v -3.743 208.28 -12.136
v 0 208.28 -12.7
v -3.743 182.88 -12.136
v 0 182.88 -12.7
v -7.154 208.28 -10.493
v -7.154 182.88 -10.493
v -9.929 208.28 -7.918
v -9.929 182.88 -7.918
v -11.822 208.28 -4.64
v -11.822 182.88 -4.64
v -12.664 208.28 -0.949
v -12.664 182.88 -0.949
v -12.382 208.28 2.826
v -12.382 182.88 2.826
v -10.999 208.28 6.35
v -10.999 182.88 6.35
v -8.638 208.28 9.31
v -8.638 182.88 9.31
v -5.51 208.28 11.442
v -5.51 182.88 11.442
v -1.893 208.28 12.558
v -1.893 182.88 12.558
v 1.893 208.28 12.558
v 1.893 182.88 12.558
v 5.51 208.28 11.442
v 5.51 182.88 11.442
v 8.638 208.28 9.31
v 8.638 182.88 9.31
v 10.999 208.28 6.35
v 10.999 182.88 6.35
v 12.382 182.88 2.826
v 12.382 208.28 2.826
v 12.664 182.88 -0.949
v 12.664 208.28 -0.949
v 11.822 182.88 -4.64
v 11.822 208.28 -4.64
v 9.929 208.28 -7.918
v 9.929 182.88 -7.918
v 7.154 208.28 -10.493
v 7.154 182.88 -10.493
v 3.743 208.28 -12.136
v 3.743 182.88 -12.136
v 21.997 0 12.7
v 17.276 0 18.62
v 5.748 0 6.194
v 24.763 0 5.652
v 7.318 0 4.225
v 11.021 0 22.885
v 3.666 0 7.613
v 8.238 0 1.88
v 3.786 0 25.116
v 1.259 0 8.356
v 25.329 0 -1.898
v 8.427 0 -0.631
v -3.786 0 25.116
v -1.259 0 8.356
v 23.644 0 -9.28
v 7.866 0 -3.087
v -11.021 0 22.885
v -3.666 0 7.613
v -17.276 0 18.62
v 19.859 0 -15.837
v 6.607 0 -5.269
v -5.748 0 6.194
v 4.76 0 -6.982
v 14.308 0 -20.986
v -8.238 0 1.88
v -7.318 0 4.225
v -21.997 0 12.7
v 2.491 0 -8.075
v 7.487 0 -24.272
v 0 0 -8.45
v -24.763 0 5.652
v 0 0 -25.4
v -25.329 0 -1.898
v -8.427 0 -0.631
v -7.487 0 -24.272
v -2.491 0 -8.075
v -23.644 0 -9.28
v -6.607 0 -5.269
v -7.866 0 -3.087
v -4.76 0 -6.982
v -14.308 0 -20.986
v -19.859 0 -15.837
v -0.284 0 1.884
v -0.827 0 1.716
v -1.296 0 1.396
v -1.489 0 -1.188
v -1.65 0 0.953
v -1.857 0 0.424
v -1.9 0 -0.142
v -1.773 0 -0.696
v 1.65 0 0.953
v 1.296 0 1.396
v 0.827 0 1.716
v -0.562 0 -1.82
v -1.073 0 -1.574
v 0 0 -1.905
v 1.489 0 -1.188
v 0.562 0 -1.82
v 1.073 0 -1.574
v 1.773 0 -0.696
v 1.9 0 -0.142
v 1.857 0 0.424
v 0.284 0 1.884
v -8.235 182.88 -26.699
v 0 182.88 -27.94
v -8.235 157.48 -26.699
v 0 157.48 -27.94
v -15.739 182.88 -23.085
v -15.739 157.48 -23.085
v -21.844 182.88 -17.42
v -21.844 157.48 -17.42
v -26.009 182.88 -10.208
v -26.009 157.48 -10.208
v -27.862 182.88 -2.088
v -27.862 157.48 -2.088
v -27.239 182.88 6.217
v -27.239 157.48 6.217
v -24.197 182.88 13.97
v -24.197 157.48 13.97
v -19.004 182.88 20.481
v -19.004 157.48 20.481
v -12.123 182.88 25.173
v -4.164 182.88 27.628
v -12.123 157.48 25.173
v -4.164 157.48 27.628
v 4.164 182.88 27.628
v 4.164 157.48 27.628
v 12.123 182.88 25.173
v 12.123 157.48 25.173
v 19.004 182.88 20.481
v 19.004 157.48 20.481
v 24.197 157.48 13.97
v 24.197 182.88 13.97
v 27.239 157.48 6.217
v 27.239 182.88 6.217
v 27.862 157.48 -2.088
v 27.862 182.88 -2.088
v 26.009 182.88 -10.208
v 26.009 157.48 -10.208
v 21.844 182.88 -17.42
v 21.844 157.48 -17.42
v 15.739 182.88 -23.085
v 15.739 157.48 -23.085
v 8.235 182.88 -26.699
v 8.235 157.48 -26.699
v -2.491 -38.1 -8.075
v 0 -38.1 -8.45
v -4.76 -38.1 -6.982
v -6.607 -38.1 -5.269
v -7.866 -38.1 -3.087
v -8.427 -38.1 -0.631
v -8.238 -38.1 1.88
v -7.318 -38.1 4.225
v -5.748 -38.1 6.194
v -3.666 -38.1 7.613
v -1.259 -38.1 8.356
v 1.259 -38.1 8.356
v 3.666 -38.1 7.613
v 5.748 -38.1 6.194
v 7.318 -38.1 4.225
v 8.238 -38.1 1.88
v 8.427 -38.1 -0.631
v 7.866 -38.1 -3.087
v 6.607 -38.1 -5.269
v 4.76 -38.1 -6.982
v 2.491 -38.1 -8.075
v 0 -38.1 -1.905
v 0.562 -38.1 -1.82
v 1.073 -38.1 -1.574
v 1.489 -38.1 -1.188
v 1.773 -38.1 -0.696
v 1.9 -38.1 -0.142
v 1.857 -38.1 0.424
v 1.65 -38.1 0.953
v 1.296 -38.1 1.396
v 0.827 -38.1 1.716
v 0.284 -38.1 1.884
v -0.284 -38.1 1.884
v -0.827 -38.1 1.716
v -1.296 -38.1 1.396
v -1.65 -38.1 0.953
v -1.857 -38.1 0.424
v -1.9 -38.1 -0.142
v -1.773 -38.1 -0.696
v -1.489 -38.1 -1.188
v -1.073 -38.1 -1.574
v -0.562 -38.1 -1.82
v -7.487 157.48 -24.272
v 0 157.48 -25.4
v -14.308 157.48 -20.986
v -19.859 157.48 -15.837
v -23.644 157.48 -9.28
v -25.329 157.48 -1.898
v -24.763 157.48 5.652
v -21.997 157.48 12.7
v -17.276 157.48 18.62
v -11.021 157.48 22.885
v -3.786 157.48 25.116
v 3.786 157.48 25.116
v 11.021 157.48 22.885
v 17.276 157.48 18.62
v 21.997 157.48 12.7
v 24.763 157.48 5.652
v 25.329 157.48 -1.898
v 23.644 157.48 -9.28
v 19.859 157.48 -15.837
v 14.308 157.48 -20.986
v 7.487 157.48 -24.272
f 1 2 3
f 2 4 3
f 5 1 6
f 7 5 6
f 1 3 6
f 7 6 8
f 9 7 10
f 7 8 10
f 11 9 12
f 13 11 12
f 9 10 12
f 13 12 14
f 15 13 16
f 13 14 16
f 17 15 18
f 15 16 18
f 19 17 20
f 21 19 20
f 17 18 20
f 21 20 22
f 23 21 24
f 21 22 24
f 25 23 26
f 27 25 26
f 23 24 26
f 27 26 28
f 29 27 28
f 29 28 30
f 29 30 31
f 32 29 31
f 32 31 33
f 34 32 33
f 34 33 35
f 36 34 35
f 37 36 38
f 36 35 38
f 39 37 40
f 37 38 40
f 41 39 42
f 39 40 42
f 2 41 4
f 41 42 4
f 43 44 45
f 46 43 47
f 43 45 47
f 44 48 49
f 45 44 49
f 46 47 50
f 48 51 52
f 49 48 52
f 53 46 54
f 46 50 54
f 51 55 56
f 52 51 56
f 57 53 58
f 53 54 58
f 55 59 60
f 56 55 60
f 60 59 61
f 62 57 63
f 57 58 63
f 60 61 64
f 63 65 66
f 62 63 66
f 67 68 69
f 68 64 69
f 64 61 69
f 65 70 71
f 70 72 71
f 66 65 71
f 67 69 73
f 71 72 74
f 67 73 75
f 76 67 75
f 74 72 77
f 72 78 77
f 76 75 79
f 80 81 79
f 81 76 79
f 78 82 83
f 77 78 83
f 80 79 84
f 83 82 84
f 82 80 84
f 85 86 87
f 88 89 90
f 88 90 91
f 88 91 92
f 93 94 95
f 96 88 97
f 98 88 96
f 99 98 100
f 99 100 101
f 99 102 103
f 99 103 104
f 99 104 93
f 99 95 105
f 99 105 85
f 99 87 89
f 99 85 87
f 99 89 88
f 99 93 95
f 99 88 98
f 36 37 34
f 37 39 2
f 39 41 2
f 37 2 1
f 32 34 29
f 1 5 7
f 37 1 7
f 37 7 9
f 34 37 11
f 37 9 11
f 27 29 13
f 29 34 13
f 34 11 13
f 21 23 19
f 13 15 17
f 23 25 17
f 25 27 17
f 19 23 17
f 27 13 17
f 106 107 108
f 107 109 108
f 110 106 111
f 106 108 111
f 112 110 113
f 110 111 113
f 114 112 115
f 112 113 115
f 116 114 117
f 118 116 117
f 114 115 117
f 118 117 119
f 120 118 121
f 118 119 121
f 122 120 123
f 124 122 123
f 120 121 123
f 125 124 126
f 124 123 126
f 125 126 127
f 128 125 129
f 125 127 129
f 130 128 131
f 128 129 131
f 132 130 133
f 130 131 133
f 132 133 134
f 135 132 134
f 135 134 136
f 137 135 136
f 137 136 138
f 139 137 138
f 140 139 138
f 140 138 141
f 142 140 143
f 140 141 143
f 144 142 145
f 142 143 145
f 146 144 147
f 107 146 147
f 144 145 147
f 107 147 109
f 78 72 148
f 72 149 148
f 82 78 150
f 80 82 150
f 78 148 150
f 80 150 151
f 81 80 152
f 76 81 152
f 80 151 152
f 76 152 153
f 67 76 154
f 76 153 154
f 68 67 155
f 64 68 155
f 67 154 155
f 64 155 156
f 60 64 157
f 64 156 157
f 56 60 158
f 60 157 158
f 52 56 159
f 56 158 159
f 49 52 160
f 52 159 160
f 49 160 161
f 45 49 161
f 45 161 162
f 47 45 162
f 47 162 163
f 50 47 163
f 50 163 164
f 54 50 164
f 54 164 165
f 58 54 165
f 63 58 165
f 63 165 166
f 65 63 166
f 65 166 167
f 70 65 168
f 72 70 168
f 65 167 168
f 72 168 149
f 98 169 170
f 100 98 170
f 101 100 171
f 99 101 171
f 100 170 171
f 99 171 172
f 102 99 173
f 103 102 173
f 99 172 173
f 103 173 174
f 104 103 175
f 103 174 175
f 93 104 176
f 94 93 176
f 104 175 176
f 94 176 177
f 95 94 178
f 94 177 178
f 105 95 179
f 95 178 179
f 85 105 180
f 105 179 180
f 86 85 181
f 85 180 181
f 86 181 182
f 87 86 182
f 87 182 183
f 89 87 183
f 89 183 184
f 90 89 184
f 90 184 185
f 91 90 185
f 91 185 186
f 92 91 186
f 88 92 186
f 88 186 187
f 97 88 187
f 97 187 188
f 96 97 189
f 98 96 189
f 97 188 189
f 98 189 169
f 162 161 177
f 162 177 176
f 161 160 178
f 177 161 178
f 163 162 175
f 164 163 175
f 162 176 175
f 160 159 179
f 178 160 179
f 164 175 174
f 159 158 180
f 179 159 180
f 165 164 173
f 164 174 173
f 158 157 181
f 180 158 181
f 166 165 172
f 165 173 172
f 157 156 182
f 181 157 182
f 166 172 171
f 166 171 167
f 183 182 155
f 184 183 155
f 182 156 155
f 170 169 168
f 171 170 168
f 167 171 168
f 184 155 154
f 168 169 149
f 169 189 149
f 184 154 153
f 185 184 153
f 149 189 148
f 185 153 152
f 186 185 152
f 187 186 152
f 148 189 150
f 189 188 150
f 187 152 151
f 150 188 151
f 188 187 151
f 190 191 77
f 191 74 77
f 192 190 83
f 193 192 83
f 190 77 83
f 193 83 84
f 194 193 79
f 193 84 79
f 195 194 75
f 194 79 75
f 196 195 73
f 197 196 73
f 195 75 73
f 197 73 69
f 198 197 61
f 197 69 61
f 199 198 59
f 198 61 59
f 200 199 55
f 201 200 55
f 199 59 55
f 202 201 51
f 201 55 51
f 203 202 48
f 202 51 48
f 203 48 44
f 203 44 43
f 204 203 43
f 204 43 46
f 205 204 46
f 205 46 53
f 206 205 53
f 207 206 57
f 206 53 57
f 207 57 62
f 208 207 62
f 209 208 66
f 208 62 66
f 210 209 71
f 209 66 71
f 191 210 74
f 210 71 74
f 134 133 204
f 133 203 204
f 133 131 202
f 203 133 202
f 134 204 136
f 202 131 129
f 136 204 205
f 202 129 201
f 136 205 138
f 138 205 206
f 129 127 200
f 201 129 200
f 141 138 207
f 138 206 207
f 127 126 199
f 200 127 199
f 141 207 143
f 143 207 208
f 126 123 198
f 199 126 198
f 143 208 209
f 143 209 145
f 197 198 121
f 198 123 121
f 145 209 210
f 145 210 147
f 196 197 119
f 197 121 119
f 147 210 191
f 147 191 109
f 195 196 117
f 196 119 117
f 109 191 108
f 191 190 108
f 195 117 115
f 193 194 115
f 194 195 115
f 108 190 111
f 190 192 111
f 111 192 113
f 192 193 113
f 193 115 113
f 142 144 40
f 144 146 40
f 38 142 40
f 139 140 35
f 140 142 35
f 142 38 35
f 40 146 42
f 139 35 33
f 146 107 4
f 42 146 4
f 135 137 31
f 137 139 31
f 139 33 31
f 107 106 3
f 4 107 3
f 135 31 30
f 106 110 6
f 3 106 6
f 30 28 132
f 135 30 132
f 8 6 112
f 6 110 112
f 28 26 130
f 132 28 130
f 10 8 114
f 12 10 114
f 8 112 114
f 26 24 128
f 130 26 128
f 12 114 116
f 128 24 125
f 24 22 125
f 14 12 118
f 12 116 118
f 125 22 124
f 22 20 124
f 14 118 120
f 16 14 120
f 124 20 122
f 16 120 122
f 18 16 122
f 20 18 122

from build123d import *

# Parameters (mm, degrees)
SKETCH2_R          = 1.905
CUT_EXTRUDE1_DEPTH = 38.1


with BuildPart() as part:
    # Sketch1 → Revolve1 (revolve)
    with BuildSketch(Plane.XY, mode=Mode.PRIVATE) as revolve1_sk:
        Polygon((12.7, 182.88), (27.94, 182.88), (27.94, 157.48), (25.4, 157.48), (25.4, 0), (8.450222624, 0), (8.450222624, -38.1), (0, -38.1), (0, 0), (0, 182.88), (0, 208.28), (12.7, 208.28), align=None)
    revolve(revolve1_sk.sketch.rotate(Axis((0, 0, 0), (0, 1, 0)), 90), axis=Axis((0, 0, 0), (0, 1, 0)))

    # Sketch2 → Cut-Extrude1 (cut)
    with BuildSketch(Plane.XZ.offset(38.1)):
        with Locations(Location((0, 0, 0), (0, 0, 270))):
            Circle(SKETCH2_R)
    extrude(amount=-CUT_EXTRUDE1_DEPTH, mode=Mode.SUBTRACT)


solid = part.part
